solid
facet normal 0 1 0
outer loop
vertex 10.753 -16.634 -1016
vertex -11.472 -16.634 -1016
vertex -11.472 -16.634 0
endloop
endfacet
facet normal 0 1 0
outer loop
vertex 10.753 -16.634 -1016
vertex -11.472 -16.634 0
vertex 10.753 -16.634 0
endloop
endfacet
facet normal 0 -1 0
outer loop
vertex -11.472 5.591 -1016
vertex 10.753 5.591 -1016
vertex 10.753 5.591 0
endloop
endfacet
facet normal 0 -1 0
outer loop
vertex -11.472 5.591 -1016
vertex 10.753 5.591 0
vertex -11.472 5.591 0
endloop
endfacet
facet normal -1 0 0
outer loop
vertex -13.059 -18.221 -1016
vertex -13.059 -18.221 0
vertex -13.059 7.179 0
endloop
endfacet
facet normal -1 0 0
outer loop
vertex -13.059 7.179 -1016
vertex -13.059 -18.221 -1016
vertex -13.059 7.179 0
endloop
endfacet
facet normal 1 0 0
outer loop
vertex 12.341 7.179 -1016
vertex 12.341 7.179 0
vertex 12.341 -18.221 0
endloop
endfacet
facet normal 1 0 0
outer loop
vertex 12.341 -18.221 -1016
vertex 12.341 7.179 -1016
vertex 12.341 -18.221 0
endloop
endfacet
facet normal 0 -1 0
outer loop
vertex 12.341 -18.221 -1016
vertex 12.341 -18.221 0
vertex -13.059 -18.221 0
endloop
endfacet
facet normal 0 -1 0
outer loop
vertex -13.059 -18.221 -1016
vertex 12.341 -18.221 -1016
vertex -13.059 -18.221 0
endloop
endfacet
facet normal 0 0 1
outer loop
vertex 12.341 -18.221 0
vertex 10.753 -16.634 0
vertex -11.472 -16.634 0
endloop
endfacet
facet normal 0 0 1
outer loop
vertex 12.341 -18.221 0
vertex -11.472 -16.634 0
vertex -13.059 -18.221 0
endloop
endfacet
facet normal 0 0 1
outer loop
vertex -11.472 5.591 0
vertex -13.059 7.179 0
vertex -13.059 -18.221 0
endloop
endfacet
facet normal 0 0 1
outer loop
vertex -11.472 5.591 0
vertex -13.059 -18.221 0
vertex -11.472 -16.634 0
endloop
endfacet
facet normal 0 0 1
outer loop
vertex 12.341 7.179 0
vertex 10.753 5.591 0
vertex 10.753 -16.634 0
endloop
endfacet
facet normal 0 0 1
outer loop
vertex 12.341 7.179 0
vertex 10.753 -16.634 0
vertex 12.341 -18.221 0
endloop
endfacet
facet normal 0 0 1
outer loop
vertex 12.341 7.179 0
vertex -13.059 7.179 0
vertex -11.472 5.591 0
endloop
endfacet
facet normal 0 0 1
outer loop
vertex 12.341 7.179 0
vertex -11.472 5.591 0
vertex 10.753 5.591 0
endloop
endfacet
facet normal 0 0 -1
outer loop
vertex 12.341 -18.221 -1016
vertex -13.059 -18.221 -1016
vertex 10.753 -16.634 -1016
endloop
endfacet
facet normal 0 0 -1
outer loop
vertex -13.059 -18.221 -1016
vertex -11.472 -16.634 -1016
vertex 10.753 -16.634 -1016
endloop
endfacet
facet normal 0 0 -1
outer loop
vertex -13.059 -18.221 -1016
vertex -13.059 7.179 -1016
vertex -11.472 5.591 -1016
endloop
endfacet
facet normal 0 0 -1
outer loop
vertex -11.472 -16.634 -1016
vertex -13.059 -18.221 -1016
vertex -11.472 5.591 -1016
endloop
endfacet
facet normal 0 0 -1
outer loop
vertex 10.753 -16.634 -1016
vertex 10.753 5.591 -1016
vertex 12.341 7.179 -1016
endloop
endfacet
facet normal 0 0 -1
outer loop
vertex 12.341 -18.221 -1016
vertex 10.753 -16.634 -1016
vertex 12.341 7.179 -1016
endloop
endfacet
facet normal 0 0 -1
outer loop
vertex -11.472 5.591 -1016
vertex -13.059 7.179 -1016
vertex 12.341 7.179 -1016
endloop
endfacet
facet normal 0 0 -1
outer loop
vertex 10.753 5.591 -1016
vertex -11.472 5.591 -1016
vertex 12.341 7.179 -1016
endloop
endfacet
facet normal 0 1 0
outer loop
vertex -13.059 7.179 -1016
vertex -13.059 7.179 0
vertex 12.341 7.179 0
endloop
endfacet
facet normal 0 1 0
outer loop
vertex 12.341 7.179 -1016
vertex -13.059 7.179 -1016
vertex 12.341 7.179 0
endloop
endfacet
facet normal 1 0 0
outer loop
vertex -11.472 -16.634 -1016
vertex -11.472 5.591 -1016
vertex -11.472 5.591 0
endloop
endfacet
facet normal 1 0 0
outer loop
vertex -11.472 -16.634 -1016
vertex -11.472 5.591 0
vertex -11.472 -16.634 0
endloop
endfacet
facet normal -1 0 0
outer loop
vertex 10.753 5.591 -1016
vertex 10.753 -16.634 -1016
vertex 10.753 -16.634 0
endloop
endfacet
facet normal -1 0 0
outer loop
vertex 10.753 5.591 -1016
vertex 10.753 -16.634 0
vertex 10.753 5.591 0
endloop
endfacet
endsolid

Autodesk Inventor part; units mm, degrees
ref_plane "YZ Plane" through (0, 0, 0) normal (1, 0, 0) x (0, 1, 0)
ref_plane "XZ Plane" through (0, 0, 0) normal (0, 1, 0) x (-1, 0, 0)
ref_plane "XY Plane" through (0, 0, 0) normal (0, 0, 1) x (1, 0, 0)
sketch "Sketch1" plane through (0, 0, 0) normal (0, 0, 1) x (1, 0, 0)
  line L0 (-13.0592, 7.1789) -> (12.3408, 7.1789)
  line L1 (12.3408, 7.1789) -> (12.3408, -18.2211)
  line L2 (12.3408, -18.2211) -> (-13.0592, -18.2211)
  line L3 (-13.0592, -18.2211) -> (-13.0592, 7.1789)
  line L4 (10.7533, 5.5914) -> (-11.4717, 5.5914)
  line L5 (-11.4717, 5.5914) -> (-11.4717, -16.6336)
  line L6 (-11.4717, -16.6336) -> (10.7533, -16.6336)
  line L7 (10.7533, -16.6336) -> (10.7533, 5.5914)
  point P0 (0, 0)
  dimension "d0" = 25.4
  dimension "d1" = 25.4
  dimension "d2" = 1.5875
extrude "Extrusion1" add sketch "Sketch1" against normal blind 1016
properties part number "40 inch extruded alluminum tube"
